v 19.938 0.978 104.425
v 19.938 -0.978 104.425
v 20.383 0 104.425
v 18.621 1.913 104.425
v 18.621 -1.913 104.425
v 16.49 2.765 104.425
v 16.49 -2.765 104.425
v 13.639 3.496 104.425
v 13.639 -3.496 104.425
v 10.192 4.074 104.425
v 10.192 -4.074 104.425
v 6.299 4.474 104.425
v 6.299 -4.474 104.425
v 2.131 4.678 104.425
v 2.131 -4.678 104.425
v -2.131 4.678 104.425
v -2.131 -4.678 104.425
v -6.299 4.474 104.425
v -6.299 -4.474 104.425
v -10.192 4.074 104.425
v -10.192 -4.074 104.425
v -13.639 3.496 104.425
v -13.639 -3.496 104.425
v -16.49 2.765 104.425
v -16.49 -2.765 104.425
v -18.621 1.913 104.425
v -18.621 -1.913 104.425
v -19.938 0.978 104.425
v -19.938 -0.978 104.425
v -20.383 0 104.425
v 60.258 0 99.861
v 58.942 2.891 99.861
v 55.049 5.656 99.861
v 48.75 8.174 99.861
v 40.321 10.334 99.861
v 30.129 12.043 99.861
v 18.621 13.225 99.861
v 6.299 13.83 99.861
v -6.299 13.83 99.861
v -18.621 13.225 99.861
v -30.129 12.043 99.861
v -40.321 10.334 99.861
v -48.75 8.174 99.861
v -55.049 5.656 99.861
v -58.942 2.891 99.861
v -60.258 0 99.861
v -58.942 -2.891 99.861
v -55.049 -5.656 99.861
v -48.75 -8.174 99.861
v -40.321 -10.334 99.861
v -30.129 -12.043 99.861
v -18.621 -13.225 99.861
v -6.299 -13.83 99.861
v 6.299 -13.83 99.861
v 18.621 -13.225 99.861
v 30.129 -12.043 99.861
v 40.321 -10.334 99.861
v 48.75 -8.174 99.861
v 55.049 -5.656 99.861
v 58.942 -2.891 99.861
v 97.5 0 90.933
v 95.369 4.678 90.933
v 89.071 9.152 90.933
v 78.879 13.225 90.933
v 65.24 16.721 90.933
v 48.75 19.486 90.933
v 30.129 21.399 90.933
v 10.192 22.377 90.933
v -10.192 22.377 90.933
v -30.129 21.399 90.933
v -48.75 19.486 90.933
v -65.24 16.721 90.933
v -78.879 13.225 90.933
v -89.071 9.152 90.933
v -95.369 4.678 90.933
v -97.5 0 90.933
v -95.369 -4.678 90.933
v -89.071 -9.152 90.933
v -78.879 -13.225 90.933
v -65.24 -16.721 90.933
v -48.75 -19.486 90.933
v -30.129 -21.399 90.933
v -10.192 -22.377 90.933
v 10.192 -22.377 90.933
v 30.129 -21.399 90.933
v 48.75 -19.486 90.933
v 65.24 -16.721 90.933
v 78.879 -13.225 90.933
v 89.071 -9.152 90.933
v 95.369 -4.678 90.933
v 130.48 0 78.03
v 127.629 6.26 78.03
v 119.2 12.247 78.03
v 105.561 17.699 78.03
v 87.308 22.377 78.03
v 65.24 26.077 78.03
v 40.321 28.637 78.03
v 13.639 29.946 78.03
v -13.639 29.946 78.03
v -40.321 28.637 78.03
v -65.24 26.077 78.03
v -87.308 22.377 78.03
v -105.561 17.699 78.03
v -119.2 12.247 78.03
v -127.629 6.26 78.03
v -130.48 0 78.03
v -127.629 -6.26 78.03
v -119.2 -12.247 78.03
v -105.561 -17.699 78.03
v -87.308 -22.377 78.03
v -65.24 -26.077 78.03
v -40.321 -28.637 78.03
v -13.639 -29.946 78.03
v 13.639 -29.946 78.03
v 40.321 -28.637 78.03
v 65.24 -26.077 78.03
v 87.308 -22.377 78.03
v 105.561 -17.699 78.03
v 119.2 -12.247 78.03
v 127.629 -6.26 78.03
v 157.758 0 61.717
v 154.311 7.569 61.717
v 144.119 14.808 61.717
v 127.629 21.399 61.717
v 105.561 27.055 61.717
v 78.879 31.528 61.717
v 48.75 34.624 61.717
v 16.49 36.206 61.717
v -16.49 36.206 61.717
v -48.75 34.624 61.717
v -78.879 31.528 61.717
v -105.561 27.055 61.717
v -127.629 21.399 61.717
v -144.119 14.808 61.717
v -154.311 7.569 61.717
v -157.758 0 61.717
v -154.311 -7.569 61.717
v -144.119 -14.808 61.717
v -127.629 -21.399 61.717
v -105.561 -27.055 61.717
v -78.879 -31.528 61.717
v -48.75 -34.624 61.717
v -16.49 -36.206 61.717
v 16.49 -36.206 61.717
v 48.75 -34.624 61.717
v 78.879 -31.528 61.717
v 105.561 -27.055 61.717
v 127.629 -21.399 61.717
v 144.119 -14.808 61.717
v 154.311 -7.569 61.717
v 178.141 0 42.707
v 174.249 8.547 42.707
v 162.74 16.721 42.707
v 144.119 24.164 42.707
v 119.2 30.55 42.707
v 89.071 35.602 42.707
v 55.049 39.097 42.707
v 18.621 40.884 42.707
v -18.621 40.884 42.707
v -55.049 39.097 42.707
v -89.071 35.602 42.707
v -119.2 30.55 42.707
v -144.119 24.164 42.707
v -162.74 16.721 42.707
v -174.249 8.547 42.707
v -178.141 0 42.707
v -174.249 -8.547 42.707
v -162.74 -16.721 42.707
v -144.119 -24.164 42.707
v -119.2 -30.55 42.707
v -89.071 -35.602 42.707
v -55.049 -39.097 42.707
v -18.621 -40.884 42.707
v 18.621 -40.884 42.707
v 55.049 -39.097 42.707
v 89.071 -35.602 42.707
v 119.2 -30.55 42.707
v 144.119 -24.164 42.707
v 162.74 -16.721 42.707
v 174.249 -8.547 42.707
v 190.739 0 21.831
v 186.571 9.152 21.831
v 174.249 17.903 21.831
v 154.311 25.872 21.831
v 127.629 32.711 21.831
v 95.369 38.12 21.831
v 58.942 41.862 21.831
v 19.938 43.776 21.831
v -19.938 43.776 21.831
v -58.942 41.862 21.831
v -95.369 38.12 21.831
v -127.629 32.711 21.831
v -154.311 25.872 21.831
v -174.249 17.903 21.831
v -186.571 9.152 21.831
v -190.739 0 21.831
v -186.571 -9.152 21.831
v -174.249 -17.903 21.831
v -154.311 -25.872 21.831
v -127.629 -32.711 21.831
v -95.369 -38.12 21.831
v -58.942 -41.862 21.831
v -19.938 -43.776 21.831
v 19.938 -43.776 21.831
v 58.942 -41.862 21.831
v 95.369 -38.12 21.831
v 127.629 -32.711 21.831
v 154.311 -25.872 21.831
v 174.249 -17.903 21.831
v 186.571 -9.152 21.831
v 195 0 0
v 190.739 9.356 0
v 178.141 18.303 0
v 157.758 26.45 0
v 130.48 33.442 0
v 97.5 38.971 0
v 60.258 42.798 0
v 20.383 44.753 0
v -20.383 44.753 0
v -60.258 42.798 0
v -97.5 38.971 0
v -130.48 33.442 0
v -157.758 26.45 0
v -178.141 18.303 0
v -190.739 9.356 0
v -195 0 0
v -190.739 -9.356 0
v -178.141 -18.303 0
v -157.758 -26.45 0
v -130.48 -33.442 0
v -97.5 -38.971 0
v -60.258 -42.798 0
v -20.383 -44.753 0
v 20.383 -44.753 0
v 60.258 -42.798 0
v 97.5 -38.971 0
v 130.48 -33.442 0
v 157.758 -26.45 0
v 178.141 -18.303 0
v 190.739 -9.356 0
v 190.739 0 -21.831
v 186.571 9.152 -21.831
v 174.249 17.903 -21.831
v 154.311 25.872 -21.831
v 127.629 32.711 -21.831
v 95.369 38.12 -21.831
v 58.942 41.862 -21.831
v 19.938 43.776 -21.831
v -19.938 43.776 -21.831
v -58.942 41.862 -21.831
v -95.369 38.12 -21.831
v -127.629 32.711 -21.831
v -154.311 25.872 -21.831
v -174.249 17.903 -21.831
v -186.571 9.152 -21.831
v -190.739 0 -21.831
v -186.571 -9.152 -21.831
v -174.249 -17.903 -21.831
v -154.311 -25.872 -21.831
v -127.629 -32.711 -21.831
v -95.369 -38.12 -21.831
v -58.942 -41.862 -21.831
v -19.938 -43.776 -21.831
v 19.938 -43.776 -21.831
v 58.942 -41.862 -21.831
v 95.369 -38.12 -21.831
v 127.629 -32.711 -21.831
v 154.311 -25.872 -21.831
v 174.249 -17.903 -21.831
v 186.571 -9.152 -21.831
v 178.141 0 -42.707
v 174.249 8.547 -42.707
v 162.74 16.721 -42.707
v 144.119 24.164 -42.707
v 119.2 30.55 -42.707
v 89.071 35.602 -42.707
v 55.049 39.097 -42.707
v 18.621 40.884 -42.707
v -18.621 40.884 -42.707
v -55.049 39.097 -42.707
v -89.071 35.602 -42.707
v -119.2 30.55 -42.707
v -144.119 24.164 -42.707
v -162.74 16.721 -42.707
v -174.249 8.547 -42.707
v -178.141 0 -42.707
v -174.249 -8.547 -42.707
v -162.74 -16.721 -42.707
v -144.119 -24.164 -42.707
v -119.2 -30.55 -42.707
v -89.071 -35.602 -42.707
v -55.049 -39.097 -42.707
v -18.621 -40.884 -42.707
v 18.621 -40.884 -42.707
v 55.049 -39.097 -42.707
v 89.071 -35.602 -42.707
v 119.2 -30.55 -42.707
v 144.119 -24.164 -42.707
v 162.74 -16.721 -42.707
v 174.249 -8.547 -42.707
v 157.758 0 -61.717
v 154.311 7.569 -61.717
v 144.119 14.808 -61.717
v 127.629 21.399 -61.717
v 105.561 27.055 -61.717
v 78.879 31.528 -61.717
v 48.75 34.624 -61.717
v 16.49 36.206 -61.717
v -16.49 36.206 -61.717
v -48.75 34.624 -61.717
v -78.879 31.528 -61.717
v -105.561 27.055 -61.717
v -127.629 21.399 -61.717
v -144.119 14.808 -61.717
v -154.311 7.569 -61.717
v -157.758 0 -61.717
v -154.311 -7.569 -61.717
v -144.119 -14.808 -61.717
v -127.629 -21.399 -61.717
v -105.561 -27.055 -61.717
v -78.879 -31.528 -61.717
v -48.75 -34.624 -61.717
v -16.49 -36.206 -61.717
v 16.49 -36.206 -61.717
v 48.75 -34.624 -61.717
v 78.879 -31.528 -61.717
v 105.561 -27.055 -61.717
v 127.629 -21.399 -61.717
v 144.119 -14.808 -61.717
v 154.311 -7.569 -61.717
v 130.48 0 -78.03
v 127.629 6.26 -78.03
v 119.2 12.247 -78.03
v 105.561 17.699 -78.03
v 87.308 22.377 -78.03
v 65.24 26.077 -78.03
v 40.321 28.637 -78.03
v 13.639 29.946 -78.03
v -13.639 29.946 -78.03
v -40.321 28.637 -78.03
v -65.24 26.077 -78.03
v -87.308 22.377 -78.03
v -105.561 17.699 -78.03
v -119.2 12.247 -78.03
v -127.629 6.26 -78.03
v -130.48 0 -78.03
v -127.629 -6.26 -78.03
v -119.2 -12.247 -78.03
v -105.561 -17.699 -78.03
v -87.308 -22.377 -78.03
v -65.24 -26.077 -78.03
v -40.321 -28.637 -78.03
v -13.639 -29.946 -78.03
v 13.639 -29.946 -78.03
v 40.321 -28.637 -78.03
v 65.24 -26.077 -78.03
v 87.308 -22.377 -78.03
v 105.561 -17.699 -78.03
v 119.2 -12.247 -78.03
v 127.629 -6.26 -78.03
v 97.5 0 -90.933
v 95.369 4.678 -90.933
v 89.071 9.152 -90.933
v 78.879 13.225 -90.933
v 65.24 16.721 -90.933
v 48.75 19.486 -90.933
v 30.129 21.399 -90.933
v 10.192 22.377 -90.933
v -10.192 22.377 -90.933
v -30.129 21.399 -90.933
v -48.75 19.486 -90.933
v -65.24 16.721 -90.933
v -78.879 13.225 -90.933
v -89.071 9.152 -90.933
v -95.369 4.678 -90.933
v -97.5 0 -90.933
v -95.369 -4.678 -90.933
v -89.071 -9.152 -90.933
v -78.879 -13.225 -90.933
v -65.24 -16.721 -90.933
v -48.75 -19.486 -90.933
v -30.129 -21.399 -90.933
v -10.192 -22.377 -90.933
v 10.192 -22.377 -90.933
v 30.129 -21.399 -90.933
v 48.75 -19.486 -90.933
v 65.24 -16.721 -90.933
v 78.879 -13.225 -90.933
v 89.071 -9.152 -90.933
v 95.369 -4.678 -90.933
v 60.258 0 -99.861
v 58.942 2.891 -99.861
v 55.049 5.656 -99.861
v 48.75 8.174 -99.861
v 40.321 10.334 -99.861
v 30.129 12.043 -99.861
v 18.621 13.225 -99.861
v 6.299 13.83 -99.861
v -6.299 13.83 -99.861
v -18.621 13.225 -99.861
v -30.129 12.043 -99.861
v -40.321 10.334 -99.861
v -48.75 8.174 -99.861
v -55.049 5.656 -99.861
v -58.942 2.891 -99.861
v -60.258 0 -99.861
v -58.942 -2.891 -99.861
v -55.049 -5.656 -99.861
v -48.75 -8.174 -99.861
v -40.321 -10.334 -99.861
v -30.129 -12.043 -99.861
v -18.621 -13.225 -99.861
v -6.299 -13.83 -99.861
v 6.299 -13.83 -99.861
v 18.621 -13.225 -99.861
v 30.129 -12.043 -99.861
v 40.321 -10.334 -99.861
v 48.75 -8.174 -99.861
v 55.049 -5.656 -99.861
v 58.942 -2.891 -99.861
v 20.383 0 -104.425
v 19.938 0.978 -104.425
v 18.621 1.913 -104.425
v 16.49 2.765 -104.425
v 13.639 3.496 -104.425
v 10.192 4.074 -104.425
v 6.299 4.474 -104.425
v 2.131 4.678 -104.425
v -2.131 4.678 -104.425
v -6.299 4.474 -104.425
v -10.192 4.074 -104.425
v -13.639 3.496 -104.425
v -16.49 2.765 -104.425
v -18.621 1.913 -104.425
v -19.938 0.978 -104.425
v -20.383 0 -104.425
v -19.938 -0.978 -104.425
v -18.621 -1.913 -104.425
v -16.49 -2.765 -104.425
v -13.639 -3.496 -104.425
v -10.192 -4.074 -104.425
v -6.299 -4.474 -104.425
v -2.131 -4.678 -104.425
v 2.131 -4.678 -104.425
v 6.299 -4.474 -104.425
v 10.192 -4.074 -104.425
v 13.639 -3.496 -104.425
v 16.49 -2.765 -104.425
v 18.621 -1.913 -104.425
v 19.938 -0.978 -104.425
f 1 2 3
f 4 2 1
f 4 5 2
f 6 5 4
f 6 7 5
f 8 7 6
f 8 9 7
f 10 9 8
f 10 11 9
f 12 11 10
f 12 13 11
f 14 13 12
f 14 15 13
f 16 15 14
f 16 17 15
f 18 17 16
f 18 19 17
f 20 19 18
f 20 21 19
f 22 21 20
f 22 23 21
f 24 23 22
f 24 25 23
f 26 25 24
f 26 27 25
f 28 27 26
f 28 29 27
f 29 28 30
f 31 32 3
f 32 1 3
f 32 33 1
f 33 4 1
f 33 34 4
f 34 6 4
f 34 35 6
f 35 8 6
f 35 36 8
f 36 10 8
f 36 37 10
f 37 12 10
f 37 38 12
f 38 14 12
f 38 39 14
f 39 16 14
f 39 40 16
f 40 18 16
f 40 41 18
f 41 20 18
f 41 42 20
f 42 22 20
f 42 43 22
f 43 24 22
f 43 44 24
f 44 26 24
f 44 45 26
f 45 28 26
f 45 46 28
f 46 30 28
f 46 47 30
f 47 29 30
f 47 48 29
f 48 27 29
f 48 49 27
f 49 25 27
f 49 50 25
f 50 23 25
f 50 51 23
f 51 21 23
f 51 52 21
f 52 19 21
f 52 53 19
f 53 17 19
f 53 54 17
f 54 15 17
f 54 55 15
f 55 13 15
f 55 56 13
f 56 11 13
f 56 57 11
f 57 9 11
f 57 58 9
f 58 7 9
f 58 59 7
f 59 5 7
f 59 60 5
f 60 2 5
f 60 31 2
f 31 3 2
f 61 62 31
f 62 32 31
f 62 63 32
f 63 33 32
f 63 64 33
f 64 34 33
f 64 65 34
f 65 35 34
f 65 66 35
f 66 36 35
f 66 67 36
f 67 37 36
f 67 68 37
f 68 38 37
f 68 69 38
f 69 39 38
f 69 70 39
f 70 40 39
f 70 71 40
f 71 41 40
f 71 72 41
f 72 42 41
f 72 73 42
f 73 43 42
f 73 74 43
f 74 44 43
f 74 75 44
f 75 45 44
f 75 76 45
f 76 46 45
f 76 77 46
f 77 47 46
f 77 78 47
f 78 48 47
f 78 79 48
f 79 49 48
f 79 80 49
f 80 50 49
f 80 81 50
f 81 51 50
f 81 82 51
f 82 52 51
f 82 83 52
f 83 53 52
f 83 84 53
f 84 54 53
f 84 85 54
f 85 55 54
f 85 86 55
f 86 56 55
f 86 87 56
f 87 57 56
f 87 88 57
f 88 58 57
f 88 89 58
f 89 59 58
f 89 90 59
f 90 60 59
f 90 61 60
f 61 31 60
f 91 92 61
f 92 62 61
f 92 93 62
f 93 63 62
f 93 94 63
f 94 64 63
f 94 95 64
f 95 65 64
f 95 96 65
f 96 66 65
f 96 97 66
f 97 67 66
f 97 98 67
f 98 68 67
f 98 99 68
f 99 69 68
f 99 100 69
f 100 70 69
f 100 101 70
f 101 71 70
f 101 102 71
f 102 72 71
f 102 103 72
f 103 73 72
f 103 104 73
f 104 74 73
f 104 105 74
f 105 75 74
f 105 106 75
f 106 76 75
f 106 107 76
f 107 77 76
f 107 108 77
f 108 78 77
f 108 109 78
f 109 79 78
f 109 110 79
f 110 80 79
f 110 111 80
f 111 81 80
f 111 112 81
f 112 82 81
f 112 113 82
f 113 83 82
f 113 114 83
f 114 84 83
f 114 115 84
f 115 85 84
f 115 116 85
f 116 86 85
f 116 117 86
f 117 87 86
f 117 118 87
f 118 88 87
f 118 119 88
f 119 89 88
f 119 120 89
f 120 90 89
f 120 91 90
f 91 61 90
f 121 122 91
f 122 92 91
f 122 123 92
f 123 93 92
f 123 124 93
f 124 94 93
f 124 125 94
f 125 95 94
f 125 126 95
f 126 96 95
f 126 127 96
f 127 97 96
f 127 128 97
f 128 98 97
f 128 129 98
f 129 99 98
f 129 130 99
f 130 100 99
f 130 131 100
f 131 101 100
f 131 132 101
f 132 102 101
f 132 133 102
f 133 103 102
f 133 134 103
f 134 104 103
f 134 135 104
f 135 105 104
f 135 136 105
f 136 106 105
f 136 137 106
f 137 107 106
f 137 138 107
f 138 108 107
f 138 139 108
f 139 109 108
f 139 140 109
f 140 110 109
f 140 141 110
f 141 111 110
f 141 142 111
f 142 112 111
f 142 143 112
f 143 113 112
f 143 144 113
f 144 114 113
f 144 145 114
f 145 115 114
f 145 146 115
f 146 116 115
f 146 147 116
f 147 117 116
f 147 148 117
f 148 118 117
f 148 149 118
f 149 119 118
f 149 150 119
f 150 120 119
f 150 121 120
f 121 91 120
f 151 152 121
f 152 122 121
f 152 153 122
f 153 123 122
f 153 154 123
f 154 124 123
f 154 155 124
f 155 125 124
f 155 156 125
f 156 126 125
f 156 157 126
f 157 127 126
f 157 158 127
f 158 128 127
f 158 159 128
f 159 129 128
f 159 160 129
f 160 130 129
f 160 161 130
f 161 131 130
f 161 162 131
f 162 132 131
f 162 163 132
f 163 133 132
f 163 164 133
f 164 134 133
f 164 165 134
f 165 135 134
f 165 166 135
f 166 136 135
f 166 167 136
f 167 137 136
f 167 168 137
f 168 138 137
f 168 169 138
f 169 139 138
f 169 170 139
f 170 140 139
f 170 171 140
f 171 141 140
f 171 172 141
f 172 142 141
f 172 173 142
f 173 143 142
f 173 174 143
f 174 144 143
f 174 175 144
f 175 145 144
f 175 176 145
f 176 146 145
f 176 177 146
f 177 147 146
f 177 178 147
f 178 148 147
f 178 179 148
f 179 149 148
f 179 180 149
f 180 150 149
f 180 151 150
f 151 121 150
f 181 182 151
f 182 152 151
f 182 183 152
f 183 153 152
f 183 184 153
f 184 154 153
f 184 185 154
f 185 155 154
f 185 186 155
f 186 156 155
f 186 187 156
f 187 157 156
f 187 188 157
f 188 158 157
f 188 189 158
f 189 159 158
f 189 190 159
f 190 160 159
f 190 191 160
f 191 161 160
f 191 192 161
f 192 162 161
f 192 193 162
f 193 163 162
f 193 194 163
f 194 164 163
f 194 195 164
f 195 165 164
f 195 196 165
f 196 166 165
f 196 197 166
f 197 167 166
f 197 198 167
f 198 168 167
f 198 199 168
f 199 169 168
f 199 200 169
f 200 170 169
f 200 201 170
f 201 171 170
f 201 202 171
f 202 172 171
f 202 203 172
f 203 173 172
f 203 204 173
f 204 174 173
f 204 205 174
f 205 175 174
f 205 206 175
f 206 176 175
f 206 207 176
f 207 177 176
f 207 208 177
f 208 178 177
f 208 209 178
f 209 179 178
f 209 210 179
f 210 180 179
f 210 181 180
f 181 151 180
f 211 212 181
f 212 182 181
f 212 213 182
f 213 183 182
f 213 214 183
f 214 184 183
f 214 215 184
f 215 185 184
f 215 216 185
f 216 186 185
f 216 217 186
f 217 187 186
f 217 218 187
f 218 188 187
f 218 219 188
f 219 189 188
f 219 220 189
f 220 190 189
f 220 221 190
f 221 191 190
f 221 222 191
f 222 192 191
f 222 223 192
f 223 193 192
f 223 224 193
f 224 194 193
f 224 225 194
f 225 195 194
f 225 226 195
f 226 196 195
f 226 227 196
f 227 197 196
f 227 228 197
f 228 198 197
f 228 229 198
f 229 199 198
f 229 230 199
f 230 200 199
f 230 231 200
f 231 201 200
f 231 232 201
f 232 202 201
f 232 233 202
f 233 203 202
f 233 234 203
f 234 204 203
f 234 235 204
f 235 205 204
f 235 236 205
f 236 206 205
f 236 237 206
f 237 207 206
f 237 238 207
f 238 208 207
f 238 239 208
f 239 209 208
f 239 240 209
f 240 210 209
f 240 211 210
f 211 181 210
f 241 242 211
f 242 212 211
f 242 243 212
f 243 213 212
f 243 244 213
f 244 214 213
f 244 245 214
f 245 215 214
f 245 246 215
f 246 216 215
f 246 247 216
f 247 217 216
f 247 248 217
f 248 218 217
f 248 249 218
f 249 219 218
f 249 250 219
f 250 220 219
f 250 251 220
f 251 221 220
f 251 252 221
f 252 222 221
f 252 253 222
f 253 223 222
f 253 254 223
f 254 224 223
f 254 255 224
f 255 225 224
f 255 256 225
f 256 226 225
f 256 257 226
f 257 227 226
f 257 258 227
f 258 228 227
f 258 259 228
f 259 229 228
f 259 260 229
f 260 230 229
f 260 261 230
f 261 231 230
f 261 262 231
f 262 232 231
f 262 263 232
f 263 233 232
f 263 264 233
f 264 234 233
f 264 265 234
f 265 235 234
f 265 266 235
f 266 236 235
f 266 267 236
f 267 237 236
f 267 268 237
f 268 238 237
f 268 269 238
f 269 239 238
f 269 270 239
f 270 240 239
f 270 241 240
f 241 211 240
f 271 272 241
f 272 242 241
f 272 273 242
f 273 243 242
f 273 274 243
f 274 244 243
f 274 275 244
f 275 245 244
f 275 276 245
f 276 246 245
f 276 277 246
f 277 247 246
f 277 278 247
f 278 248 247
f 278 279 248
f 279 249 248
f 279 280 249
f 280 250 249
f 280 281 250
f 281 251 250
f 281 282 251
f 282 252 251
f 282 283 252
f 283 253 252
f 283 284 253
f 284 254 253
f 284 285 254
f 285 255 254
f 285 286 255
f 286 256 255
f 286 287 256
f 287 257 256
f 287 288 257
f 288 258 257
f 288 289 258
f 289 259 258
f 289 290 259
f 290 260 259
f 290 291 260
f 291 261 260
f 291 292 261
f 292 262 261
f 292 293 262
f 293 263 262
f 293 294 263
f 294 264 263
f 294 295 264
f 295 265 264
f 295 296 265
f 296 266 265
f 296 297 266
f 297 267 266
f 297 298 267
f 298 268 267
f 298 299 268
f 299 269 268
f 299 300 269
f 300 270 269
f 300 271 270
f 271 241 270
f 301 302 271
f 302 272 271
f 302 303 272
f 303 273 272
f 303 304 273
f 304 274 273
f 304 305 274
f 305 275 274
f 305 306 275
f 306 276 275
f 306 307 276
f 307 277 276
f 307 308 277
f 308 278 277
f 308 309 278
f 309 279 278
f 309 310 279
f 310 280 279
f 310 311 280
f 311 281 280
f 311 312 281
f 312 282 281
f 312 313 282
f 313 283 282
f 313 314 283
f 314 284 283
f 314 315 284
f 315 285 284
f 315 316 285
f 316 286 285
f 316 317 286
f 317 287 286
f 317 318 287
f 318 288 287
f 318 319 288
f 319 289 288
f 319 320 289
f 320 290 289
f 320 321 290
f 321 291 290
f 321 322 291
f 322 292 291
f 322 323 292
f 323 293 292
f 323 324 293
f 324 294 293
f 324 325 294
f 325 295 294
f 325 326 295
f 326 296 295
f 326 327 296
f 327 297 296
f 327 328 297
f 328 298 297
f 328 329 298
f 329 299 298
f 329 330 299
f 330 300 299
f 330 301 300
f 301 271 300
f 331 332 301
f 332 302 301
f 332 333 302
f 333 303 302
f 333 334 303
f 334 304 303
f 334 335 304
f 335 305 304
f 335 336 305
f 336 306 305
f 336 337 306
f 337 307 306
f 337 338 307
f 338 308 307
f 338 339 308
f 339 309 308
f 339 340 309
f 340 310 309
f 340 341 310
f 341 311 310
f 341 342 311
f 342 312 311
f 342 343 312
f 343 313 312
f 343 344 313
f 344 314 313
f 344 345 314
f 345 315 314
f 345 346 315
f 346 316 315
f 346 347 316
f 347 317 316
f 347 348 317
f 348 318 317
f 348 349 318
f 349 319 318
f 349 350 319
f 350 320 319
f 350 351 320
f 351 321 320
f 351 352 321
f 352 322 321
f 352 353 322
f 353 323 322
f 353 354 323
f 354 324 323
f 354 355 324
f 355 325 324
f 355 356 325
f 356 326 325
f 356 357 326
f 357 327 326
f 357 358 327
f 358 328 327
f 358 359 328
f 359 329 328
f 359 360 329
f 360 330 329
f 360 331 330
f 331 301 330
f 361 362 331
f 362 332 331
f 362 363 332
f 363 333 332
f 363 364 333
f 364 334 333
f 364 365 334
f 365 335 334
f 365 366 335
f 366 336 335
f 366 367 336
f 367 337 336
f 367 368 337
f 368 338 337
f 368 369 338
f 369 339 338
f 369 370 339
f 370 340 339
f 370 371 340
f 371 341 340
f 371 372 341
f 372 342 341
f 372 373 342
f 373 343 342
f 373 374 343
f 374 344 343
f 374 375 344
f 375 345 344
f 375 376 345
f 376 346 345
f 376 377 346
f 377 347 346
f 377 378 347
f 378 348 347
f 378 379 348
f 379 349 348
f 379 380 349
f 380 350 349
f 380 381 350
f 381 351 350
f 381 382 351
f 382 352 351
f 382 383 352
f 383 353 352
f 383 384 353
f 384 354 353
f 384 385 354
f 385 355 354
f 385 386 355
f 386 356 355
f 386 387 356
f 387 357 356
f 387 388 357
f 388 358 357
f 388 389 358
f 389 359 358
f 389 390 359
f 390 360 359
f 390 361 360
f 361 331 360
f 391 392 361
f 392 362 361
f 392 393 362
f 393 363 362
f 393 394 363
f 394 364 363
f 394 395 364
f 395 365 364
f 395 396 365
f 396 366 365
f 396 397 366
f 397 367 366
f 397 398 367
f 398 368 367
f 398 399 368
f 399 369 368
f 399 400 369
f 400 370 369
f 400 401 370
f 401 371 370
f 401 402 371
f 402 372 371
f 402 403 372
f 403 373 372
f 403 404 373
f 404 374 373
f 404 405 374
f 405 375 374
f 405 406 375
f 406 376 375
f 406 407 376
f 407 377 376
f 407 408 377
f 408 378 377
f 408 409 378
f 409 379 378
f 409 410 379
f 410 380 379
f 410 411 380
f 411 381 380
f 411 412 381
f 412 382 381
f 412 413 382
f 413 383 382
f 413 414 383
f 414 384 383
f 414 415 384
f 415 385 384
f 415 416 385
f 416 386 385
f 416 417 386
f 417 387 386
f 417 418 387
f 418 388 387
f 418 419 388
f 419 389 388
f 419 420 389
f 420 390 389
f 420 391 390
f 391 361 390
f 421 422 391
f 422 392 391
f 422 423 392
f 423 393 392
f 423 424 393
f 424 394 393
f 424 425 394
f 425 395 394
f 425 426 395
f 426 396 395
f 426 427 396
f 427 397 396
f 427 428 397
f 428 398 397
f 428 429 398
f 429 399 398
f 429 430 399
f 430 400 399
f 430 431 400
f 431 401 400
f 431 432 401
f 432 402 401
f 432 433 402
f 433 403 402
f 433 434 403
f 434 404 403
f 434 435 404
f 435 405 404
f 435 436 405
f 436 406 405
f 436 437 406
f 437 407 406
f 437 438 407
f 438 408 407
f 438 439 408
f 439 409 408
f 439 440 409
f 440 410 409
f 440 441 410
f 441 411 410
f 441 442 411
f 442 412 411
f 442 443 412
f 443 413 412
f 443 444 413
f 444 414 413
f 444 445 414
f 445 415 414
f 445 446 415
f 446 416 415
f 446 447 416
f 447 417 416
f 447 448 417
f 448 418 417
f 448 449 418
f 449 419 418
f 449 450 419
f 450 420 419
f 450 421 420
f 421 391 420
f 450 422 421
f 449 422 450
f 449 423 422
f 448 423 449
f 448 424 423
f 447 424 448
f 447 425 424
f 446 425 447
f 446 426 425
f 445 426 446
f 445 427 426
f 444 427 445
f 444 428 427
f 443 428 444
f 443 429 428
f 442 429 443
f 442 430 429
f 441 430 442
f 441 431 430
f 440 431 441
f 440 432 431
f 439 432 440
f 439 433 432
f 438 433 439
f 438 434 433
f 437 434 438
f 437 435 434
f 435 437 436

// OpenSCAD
// Generated by SolidPython 1.0.1 on 2020-07-29 00:46:50


scale(v = [13, 3, 7]) {
	sphere(r = 15);
}
/***********************************************
*********      SolidPython code:      **********
************************************************
 
# import packages: SolidPython
from solid import *
from solid.utils import *
from itertools import chain, combinations, permutations


class Resize:

    def __init__(self, scad_file):
        self.scad_file = scad_file
        #self.scad_file = import_scad(scad_file)
        # cone/cylinder param:
        self.r1 = 0
        self.r2 = 0
        self.h = 0
        # rectangular prism param:
        self.w = 0
        self.l = 0
        # ellipse param:
        self.r = 0

    # import OpenScad code (file name corresponds to shape)


    # classify shape + parameters
    def assign(self, param1, param2, param3):
        if self.scad_file == 'cone.scad':
            self.r1 = param1
            self.r2 = param2
            self.h = param3
        elif self.scad_file == 'cylinder.scad':
            self.r1 = param1
            self.r2 = param2
            self.h = param3
        elif self.scad_file == 'rectangularPrism.scad':
            self.h = param1
            self.l = param2
            self.w = param3
        else:
            self.r = param1
            self.h = param2

    # resize parameters
    def iterate(self):
        x = range(3, 20, 2)
        i = 1
        if self.scad_file == 'cone.scad':
            tempList = list(permutations(x, 2))
            for temp in tempList:
                param1 = temp[0]
                param2 = temp[1]
                filepath = 'produced_scad_files/' + 'cone' + str(param1) + '_' + str(param2) + '_' + '.scad'
                scad_render_to_file(cylinder(h=param1, r1=param2, r2=0), filepath)

        elif self.scad_file == 'cylinder.scad':
            tempList = list(permutations(x, 3))
            for temp in tempList:
                param1 = temp[0]
                param2 = temp[1]
                filepath = 'produced_scad_files/' + 'cylinder' + str(param1) + '_' + str(param2) + '_' + '.scad'
                scad_render_to_file(cylinder(h=param1, r1=param2, r2=param2), filepath)

        elif self.scad_file == 'rectangularPrism.scad':
            tempList = list(permutations(x, 3))
            for temp in tempList:
                param1 = temp[0]
                param2 = temp[1]
                param3 = temp[2]
                filepath = 'produced_scad_files/' + 'rectangularPrism' + str(param1) + '_' + str(param2) + '_' + str(
                    param3) + '.scad'
                scad_render_to_file(cube(size=(param1, param2, param3)), filepath)

        elif self.scad_file == 'ellipse.scad':
            tempList = list(permutations(x, 4))
            for temp in tempList:
                param1 = temp[0]
                param2 = temp[1]
                param3 = temp[2]
                param4 = temp[3]
                filepath = 'produced_scad_files/' + 'ellipse' + str(param1) + '_' + str(param2) + '_' + str(param3) + '_' + str(param4) + '.scad'
                scad_render_to_file(scale([param1, param2, param3])(sphere(r=param4)), filepath)

    def render_to_scadfile(self):
        scad_render_to_file(scad, 'example.scad') 
 
************************************************/
